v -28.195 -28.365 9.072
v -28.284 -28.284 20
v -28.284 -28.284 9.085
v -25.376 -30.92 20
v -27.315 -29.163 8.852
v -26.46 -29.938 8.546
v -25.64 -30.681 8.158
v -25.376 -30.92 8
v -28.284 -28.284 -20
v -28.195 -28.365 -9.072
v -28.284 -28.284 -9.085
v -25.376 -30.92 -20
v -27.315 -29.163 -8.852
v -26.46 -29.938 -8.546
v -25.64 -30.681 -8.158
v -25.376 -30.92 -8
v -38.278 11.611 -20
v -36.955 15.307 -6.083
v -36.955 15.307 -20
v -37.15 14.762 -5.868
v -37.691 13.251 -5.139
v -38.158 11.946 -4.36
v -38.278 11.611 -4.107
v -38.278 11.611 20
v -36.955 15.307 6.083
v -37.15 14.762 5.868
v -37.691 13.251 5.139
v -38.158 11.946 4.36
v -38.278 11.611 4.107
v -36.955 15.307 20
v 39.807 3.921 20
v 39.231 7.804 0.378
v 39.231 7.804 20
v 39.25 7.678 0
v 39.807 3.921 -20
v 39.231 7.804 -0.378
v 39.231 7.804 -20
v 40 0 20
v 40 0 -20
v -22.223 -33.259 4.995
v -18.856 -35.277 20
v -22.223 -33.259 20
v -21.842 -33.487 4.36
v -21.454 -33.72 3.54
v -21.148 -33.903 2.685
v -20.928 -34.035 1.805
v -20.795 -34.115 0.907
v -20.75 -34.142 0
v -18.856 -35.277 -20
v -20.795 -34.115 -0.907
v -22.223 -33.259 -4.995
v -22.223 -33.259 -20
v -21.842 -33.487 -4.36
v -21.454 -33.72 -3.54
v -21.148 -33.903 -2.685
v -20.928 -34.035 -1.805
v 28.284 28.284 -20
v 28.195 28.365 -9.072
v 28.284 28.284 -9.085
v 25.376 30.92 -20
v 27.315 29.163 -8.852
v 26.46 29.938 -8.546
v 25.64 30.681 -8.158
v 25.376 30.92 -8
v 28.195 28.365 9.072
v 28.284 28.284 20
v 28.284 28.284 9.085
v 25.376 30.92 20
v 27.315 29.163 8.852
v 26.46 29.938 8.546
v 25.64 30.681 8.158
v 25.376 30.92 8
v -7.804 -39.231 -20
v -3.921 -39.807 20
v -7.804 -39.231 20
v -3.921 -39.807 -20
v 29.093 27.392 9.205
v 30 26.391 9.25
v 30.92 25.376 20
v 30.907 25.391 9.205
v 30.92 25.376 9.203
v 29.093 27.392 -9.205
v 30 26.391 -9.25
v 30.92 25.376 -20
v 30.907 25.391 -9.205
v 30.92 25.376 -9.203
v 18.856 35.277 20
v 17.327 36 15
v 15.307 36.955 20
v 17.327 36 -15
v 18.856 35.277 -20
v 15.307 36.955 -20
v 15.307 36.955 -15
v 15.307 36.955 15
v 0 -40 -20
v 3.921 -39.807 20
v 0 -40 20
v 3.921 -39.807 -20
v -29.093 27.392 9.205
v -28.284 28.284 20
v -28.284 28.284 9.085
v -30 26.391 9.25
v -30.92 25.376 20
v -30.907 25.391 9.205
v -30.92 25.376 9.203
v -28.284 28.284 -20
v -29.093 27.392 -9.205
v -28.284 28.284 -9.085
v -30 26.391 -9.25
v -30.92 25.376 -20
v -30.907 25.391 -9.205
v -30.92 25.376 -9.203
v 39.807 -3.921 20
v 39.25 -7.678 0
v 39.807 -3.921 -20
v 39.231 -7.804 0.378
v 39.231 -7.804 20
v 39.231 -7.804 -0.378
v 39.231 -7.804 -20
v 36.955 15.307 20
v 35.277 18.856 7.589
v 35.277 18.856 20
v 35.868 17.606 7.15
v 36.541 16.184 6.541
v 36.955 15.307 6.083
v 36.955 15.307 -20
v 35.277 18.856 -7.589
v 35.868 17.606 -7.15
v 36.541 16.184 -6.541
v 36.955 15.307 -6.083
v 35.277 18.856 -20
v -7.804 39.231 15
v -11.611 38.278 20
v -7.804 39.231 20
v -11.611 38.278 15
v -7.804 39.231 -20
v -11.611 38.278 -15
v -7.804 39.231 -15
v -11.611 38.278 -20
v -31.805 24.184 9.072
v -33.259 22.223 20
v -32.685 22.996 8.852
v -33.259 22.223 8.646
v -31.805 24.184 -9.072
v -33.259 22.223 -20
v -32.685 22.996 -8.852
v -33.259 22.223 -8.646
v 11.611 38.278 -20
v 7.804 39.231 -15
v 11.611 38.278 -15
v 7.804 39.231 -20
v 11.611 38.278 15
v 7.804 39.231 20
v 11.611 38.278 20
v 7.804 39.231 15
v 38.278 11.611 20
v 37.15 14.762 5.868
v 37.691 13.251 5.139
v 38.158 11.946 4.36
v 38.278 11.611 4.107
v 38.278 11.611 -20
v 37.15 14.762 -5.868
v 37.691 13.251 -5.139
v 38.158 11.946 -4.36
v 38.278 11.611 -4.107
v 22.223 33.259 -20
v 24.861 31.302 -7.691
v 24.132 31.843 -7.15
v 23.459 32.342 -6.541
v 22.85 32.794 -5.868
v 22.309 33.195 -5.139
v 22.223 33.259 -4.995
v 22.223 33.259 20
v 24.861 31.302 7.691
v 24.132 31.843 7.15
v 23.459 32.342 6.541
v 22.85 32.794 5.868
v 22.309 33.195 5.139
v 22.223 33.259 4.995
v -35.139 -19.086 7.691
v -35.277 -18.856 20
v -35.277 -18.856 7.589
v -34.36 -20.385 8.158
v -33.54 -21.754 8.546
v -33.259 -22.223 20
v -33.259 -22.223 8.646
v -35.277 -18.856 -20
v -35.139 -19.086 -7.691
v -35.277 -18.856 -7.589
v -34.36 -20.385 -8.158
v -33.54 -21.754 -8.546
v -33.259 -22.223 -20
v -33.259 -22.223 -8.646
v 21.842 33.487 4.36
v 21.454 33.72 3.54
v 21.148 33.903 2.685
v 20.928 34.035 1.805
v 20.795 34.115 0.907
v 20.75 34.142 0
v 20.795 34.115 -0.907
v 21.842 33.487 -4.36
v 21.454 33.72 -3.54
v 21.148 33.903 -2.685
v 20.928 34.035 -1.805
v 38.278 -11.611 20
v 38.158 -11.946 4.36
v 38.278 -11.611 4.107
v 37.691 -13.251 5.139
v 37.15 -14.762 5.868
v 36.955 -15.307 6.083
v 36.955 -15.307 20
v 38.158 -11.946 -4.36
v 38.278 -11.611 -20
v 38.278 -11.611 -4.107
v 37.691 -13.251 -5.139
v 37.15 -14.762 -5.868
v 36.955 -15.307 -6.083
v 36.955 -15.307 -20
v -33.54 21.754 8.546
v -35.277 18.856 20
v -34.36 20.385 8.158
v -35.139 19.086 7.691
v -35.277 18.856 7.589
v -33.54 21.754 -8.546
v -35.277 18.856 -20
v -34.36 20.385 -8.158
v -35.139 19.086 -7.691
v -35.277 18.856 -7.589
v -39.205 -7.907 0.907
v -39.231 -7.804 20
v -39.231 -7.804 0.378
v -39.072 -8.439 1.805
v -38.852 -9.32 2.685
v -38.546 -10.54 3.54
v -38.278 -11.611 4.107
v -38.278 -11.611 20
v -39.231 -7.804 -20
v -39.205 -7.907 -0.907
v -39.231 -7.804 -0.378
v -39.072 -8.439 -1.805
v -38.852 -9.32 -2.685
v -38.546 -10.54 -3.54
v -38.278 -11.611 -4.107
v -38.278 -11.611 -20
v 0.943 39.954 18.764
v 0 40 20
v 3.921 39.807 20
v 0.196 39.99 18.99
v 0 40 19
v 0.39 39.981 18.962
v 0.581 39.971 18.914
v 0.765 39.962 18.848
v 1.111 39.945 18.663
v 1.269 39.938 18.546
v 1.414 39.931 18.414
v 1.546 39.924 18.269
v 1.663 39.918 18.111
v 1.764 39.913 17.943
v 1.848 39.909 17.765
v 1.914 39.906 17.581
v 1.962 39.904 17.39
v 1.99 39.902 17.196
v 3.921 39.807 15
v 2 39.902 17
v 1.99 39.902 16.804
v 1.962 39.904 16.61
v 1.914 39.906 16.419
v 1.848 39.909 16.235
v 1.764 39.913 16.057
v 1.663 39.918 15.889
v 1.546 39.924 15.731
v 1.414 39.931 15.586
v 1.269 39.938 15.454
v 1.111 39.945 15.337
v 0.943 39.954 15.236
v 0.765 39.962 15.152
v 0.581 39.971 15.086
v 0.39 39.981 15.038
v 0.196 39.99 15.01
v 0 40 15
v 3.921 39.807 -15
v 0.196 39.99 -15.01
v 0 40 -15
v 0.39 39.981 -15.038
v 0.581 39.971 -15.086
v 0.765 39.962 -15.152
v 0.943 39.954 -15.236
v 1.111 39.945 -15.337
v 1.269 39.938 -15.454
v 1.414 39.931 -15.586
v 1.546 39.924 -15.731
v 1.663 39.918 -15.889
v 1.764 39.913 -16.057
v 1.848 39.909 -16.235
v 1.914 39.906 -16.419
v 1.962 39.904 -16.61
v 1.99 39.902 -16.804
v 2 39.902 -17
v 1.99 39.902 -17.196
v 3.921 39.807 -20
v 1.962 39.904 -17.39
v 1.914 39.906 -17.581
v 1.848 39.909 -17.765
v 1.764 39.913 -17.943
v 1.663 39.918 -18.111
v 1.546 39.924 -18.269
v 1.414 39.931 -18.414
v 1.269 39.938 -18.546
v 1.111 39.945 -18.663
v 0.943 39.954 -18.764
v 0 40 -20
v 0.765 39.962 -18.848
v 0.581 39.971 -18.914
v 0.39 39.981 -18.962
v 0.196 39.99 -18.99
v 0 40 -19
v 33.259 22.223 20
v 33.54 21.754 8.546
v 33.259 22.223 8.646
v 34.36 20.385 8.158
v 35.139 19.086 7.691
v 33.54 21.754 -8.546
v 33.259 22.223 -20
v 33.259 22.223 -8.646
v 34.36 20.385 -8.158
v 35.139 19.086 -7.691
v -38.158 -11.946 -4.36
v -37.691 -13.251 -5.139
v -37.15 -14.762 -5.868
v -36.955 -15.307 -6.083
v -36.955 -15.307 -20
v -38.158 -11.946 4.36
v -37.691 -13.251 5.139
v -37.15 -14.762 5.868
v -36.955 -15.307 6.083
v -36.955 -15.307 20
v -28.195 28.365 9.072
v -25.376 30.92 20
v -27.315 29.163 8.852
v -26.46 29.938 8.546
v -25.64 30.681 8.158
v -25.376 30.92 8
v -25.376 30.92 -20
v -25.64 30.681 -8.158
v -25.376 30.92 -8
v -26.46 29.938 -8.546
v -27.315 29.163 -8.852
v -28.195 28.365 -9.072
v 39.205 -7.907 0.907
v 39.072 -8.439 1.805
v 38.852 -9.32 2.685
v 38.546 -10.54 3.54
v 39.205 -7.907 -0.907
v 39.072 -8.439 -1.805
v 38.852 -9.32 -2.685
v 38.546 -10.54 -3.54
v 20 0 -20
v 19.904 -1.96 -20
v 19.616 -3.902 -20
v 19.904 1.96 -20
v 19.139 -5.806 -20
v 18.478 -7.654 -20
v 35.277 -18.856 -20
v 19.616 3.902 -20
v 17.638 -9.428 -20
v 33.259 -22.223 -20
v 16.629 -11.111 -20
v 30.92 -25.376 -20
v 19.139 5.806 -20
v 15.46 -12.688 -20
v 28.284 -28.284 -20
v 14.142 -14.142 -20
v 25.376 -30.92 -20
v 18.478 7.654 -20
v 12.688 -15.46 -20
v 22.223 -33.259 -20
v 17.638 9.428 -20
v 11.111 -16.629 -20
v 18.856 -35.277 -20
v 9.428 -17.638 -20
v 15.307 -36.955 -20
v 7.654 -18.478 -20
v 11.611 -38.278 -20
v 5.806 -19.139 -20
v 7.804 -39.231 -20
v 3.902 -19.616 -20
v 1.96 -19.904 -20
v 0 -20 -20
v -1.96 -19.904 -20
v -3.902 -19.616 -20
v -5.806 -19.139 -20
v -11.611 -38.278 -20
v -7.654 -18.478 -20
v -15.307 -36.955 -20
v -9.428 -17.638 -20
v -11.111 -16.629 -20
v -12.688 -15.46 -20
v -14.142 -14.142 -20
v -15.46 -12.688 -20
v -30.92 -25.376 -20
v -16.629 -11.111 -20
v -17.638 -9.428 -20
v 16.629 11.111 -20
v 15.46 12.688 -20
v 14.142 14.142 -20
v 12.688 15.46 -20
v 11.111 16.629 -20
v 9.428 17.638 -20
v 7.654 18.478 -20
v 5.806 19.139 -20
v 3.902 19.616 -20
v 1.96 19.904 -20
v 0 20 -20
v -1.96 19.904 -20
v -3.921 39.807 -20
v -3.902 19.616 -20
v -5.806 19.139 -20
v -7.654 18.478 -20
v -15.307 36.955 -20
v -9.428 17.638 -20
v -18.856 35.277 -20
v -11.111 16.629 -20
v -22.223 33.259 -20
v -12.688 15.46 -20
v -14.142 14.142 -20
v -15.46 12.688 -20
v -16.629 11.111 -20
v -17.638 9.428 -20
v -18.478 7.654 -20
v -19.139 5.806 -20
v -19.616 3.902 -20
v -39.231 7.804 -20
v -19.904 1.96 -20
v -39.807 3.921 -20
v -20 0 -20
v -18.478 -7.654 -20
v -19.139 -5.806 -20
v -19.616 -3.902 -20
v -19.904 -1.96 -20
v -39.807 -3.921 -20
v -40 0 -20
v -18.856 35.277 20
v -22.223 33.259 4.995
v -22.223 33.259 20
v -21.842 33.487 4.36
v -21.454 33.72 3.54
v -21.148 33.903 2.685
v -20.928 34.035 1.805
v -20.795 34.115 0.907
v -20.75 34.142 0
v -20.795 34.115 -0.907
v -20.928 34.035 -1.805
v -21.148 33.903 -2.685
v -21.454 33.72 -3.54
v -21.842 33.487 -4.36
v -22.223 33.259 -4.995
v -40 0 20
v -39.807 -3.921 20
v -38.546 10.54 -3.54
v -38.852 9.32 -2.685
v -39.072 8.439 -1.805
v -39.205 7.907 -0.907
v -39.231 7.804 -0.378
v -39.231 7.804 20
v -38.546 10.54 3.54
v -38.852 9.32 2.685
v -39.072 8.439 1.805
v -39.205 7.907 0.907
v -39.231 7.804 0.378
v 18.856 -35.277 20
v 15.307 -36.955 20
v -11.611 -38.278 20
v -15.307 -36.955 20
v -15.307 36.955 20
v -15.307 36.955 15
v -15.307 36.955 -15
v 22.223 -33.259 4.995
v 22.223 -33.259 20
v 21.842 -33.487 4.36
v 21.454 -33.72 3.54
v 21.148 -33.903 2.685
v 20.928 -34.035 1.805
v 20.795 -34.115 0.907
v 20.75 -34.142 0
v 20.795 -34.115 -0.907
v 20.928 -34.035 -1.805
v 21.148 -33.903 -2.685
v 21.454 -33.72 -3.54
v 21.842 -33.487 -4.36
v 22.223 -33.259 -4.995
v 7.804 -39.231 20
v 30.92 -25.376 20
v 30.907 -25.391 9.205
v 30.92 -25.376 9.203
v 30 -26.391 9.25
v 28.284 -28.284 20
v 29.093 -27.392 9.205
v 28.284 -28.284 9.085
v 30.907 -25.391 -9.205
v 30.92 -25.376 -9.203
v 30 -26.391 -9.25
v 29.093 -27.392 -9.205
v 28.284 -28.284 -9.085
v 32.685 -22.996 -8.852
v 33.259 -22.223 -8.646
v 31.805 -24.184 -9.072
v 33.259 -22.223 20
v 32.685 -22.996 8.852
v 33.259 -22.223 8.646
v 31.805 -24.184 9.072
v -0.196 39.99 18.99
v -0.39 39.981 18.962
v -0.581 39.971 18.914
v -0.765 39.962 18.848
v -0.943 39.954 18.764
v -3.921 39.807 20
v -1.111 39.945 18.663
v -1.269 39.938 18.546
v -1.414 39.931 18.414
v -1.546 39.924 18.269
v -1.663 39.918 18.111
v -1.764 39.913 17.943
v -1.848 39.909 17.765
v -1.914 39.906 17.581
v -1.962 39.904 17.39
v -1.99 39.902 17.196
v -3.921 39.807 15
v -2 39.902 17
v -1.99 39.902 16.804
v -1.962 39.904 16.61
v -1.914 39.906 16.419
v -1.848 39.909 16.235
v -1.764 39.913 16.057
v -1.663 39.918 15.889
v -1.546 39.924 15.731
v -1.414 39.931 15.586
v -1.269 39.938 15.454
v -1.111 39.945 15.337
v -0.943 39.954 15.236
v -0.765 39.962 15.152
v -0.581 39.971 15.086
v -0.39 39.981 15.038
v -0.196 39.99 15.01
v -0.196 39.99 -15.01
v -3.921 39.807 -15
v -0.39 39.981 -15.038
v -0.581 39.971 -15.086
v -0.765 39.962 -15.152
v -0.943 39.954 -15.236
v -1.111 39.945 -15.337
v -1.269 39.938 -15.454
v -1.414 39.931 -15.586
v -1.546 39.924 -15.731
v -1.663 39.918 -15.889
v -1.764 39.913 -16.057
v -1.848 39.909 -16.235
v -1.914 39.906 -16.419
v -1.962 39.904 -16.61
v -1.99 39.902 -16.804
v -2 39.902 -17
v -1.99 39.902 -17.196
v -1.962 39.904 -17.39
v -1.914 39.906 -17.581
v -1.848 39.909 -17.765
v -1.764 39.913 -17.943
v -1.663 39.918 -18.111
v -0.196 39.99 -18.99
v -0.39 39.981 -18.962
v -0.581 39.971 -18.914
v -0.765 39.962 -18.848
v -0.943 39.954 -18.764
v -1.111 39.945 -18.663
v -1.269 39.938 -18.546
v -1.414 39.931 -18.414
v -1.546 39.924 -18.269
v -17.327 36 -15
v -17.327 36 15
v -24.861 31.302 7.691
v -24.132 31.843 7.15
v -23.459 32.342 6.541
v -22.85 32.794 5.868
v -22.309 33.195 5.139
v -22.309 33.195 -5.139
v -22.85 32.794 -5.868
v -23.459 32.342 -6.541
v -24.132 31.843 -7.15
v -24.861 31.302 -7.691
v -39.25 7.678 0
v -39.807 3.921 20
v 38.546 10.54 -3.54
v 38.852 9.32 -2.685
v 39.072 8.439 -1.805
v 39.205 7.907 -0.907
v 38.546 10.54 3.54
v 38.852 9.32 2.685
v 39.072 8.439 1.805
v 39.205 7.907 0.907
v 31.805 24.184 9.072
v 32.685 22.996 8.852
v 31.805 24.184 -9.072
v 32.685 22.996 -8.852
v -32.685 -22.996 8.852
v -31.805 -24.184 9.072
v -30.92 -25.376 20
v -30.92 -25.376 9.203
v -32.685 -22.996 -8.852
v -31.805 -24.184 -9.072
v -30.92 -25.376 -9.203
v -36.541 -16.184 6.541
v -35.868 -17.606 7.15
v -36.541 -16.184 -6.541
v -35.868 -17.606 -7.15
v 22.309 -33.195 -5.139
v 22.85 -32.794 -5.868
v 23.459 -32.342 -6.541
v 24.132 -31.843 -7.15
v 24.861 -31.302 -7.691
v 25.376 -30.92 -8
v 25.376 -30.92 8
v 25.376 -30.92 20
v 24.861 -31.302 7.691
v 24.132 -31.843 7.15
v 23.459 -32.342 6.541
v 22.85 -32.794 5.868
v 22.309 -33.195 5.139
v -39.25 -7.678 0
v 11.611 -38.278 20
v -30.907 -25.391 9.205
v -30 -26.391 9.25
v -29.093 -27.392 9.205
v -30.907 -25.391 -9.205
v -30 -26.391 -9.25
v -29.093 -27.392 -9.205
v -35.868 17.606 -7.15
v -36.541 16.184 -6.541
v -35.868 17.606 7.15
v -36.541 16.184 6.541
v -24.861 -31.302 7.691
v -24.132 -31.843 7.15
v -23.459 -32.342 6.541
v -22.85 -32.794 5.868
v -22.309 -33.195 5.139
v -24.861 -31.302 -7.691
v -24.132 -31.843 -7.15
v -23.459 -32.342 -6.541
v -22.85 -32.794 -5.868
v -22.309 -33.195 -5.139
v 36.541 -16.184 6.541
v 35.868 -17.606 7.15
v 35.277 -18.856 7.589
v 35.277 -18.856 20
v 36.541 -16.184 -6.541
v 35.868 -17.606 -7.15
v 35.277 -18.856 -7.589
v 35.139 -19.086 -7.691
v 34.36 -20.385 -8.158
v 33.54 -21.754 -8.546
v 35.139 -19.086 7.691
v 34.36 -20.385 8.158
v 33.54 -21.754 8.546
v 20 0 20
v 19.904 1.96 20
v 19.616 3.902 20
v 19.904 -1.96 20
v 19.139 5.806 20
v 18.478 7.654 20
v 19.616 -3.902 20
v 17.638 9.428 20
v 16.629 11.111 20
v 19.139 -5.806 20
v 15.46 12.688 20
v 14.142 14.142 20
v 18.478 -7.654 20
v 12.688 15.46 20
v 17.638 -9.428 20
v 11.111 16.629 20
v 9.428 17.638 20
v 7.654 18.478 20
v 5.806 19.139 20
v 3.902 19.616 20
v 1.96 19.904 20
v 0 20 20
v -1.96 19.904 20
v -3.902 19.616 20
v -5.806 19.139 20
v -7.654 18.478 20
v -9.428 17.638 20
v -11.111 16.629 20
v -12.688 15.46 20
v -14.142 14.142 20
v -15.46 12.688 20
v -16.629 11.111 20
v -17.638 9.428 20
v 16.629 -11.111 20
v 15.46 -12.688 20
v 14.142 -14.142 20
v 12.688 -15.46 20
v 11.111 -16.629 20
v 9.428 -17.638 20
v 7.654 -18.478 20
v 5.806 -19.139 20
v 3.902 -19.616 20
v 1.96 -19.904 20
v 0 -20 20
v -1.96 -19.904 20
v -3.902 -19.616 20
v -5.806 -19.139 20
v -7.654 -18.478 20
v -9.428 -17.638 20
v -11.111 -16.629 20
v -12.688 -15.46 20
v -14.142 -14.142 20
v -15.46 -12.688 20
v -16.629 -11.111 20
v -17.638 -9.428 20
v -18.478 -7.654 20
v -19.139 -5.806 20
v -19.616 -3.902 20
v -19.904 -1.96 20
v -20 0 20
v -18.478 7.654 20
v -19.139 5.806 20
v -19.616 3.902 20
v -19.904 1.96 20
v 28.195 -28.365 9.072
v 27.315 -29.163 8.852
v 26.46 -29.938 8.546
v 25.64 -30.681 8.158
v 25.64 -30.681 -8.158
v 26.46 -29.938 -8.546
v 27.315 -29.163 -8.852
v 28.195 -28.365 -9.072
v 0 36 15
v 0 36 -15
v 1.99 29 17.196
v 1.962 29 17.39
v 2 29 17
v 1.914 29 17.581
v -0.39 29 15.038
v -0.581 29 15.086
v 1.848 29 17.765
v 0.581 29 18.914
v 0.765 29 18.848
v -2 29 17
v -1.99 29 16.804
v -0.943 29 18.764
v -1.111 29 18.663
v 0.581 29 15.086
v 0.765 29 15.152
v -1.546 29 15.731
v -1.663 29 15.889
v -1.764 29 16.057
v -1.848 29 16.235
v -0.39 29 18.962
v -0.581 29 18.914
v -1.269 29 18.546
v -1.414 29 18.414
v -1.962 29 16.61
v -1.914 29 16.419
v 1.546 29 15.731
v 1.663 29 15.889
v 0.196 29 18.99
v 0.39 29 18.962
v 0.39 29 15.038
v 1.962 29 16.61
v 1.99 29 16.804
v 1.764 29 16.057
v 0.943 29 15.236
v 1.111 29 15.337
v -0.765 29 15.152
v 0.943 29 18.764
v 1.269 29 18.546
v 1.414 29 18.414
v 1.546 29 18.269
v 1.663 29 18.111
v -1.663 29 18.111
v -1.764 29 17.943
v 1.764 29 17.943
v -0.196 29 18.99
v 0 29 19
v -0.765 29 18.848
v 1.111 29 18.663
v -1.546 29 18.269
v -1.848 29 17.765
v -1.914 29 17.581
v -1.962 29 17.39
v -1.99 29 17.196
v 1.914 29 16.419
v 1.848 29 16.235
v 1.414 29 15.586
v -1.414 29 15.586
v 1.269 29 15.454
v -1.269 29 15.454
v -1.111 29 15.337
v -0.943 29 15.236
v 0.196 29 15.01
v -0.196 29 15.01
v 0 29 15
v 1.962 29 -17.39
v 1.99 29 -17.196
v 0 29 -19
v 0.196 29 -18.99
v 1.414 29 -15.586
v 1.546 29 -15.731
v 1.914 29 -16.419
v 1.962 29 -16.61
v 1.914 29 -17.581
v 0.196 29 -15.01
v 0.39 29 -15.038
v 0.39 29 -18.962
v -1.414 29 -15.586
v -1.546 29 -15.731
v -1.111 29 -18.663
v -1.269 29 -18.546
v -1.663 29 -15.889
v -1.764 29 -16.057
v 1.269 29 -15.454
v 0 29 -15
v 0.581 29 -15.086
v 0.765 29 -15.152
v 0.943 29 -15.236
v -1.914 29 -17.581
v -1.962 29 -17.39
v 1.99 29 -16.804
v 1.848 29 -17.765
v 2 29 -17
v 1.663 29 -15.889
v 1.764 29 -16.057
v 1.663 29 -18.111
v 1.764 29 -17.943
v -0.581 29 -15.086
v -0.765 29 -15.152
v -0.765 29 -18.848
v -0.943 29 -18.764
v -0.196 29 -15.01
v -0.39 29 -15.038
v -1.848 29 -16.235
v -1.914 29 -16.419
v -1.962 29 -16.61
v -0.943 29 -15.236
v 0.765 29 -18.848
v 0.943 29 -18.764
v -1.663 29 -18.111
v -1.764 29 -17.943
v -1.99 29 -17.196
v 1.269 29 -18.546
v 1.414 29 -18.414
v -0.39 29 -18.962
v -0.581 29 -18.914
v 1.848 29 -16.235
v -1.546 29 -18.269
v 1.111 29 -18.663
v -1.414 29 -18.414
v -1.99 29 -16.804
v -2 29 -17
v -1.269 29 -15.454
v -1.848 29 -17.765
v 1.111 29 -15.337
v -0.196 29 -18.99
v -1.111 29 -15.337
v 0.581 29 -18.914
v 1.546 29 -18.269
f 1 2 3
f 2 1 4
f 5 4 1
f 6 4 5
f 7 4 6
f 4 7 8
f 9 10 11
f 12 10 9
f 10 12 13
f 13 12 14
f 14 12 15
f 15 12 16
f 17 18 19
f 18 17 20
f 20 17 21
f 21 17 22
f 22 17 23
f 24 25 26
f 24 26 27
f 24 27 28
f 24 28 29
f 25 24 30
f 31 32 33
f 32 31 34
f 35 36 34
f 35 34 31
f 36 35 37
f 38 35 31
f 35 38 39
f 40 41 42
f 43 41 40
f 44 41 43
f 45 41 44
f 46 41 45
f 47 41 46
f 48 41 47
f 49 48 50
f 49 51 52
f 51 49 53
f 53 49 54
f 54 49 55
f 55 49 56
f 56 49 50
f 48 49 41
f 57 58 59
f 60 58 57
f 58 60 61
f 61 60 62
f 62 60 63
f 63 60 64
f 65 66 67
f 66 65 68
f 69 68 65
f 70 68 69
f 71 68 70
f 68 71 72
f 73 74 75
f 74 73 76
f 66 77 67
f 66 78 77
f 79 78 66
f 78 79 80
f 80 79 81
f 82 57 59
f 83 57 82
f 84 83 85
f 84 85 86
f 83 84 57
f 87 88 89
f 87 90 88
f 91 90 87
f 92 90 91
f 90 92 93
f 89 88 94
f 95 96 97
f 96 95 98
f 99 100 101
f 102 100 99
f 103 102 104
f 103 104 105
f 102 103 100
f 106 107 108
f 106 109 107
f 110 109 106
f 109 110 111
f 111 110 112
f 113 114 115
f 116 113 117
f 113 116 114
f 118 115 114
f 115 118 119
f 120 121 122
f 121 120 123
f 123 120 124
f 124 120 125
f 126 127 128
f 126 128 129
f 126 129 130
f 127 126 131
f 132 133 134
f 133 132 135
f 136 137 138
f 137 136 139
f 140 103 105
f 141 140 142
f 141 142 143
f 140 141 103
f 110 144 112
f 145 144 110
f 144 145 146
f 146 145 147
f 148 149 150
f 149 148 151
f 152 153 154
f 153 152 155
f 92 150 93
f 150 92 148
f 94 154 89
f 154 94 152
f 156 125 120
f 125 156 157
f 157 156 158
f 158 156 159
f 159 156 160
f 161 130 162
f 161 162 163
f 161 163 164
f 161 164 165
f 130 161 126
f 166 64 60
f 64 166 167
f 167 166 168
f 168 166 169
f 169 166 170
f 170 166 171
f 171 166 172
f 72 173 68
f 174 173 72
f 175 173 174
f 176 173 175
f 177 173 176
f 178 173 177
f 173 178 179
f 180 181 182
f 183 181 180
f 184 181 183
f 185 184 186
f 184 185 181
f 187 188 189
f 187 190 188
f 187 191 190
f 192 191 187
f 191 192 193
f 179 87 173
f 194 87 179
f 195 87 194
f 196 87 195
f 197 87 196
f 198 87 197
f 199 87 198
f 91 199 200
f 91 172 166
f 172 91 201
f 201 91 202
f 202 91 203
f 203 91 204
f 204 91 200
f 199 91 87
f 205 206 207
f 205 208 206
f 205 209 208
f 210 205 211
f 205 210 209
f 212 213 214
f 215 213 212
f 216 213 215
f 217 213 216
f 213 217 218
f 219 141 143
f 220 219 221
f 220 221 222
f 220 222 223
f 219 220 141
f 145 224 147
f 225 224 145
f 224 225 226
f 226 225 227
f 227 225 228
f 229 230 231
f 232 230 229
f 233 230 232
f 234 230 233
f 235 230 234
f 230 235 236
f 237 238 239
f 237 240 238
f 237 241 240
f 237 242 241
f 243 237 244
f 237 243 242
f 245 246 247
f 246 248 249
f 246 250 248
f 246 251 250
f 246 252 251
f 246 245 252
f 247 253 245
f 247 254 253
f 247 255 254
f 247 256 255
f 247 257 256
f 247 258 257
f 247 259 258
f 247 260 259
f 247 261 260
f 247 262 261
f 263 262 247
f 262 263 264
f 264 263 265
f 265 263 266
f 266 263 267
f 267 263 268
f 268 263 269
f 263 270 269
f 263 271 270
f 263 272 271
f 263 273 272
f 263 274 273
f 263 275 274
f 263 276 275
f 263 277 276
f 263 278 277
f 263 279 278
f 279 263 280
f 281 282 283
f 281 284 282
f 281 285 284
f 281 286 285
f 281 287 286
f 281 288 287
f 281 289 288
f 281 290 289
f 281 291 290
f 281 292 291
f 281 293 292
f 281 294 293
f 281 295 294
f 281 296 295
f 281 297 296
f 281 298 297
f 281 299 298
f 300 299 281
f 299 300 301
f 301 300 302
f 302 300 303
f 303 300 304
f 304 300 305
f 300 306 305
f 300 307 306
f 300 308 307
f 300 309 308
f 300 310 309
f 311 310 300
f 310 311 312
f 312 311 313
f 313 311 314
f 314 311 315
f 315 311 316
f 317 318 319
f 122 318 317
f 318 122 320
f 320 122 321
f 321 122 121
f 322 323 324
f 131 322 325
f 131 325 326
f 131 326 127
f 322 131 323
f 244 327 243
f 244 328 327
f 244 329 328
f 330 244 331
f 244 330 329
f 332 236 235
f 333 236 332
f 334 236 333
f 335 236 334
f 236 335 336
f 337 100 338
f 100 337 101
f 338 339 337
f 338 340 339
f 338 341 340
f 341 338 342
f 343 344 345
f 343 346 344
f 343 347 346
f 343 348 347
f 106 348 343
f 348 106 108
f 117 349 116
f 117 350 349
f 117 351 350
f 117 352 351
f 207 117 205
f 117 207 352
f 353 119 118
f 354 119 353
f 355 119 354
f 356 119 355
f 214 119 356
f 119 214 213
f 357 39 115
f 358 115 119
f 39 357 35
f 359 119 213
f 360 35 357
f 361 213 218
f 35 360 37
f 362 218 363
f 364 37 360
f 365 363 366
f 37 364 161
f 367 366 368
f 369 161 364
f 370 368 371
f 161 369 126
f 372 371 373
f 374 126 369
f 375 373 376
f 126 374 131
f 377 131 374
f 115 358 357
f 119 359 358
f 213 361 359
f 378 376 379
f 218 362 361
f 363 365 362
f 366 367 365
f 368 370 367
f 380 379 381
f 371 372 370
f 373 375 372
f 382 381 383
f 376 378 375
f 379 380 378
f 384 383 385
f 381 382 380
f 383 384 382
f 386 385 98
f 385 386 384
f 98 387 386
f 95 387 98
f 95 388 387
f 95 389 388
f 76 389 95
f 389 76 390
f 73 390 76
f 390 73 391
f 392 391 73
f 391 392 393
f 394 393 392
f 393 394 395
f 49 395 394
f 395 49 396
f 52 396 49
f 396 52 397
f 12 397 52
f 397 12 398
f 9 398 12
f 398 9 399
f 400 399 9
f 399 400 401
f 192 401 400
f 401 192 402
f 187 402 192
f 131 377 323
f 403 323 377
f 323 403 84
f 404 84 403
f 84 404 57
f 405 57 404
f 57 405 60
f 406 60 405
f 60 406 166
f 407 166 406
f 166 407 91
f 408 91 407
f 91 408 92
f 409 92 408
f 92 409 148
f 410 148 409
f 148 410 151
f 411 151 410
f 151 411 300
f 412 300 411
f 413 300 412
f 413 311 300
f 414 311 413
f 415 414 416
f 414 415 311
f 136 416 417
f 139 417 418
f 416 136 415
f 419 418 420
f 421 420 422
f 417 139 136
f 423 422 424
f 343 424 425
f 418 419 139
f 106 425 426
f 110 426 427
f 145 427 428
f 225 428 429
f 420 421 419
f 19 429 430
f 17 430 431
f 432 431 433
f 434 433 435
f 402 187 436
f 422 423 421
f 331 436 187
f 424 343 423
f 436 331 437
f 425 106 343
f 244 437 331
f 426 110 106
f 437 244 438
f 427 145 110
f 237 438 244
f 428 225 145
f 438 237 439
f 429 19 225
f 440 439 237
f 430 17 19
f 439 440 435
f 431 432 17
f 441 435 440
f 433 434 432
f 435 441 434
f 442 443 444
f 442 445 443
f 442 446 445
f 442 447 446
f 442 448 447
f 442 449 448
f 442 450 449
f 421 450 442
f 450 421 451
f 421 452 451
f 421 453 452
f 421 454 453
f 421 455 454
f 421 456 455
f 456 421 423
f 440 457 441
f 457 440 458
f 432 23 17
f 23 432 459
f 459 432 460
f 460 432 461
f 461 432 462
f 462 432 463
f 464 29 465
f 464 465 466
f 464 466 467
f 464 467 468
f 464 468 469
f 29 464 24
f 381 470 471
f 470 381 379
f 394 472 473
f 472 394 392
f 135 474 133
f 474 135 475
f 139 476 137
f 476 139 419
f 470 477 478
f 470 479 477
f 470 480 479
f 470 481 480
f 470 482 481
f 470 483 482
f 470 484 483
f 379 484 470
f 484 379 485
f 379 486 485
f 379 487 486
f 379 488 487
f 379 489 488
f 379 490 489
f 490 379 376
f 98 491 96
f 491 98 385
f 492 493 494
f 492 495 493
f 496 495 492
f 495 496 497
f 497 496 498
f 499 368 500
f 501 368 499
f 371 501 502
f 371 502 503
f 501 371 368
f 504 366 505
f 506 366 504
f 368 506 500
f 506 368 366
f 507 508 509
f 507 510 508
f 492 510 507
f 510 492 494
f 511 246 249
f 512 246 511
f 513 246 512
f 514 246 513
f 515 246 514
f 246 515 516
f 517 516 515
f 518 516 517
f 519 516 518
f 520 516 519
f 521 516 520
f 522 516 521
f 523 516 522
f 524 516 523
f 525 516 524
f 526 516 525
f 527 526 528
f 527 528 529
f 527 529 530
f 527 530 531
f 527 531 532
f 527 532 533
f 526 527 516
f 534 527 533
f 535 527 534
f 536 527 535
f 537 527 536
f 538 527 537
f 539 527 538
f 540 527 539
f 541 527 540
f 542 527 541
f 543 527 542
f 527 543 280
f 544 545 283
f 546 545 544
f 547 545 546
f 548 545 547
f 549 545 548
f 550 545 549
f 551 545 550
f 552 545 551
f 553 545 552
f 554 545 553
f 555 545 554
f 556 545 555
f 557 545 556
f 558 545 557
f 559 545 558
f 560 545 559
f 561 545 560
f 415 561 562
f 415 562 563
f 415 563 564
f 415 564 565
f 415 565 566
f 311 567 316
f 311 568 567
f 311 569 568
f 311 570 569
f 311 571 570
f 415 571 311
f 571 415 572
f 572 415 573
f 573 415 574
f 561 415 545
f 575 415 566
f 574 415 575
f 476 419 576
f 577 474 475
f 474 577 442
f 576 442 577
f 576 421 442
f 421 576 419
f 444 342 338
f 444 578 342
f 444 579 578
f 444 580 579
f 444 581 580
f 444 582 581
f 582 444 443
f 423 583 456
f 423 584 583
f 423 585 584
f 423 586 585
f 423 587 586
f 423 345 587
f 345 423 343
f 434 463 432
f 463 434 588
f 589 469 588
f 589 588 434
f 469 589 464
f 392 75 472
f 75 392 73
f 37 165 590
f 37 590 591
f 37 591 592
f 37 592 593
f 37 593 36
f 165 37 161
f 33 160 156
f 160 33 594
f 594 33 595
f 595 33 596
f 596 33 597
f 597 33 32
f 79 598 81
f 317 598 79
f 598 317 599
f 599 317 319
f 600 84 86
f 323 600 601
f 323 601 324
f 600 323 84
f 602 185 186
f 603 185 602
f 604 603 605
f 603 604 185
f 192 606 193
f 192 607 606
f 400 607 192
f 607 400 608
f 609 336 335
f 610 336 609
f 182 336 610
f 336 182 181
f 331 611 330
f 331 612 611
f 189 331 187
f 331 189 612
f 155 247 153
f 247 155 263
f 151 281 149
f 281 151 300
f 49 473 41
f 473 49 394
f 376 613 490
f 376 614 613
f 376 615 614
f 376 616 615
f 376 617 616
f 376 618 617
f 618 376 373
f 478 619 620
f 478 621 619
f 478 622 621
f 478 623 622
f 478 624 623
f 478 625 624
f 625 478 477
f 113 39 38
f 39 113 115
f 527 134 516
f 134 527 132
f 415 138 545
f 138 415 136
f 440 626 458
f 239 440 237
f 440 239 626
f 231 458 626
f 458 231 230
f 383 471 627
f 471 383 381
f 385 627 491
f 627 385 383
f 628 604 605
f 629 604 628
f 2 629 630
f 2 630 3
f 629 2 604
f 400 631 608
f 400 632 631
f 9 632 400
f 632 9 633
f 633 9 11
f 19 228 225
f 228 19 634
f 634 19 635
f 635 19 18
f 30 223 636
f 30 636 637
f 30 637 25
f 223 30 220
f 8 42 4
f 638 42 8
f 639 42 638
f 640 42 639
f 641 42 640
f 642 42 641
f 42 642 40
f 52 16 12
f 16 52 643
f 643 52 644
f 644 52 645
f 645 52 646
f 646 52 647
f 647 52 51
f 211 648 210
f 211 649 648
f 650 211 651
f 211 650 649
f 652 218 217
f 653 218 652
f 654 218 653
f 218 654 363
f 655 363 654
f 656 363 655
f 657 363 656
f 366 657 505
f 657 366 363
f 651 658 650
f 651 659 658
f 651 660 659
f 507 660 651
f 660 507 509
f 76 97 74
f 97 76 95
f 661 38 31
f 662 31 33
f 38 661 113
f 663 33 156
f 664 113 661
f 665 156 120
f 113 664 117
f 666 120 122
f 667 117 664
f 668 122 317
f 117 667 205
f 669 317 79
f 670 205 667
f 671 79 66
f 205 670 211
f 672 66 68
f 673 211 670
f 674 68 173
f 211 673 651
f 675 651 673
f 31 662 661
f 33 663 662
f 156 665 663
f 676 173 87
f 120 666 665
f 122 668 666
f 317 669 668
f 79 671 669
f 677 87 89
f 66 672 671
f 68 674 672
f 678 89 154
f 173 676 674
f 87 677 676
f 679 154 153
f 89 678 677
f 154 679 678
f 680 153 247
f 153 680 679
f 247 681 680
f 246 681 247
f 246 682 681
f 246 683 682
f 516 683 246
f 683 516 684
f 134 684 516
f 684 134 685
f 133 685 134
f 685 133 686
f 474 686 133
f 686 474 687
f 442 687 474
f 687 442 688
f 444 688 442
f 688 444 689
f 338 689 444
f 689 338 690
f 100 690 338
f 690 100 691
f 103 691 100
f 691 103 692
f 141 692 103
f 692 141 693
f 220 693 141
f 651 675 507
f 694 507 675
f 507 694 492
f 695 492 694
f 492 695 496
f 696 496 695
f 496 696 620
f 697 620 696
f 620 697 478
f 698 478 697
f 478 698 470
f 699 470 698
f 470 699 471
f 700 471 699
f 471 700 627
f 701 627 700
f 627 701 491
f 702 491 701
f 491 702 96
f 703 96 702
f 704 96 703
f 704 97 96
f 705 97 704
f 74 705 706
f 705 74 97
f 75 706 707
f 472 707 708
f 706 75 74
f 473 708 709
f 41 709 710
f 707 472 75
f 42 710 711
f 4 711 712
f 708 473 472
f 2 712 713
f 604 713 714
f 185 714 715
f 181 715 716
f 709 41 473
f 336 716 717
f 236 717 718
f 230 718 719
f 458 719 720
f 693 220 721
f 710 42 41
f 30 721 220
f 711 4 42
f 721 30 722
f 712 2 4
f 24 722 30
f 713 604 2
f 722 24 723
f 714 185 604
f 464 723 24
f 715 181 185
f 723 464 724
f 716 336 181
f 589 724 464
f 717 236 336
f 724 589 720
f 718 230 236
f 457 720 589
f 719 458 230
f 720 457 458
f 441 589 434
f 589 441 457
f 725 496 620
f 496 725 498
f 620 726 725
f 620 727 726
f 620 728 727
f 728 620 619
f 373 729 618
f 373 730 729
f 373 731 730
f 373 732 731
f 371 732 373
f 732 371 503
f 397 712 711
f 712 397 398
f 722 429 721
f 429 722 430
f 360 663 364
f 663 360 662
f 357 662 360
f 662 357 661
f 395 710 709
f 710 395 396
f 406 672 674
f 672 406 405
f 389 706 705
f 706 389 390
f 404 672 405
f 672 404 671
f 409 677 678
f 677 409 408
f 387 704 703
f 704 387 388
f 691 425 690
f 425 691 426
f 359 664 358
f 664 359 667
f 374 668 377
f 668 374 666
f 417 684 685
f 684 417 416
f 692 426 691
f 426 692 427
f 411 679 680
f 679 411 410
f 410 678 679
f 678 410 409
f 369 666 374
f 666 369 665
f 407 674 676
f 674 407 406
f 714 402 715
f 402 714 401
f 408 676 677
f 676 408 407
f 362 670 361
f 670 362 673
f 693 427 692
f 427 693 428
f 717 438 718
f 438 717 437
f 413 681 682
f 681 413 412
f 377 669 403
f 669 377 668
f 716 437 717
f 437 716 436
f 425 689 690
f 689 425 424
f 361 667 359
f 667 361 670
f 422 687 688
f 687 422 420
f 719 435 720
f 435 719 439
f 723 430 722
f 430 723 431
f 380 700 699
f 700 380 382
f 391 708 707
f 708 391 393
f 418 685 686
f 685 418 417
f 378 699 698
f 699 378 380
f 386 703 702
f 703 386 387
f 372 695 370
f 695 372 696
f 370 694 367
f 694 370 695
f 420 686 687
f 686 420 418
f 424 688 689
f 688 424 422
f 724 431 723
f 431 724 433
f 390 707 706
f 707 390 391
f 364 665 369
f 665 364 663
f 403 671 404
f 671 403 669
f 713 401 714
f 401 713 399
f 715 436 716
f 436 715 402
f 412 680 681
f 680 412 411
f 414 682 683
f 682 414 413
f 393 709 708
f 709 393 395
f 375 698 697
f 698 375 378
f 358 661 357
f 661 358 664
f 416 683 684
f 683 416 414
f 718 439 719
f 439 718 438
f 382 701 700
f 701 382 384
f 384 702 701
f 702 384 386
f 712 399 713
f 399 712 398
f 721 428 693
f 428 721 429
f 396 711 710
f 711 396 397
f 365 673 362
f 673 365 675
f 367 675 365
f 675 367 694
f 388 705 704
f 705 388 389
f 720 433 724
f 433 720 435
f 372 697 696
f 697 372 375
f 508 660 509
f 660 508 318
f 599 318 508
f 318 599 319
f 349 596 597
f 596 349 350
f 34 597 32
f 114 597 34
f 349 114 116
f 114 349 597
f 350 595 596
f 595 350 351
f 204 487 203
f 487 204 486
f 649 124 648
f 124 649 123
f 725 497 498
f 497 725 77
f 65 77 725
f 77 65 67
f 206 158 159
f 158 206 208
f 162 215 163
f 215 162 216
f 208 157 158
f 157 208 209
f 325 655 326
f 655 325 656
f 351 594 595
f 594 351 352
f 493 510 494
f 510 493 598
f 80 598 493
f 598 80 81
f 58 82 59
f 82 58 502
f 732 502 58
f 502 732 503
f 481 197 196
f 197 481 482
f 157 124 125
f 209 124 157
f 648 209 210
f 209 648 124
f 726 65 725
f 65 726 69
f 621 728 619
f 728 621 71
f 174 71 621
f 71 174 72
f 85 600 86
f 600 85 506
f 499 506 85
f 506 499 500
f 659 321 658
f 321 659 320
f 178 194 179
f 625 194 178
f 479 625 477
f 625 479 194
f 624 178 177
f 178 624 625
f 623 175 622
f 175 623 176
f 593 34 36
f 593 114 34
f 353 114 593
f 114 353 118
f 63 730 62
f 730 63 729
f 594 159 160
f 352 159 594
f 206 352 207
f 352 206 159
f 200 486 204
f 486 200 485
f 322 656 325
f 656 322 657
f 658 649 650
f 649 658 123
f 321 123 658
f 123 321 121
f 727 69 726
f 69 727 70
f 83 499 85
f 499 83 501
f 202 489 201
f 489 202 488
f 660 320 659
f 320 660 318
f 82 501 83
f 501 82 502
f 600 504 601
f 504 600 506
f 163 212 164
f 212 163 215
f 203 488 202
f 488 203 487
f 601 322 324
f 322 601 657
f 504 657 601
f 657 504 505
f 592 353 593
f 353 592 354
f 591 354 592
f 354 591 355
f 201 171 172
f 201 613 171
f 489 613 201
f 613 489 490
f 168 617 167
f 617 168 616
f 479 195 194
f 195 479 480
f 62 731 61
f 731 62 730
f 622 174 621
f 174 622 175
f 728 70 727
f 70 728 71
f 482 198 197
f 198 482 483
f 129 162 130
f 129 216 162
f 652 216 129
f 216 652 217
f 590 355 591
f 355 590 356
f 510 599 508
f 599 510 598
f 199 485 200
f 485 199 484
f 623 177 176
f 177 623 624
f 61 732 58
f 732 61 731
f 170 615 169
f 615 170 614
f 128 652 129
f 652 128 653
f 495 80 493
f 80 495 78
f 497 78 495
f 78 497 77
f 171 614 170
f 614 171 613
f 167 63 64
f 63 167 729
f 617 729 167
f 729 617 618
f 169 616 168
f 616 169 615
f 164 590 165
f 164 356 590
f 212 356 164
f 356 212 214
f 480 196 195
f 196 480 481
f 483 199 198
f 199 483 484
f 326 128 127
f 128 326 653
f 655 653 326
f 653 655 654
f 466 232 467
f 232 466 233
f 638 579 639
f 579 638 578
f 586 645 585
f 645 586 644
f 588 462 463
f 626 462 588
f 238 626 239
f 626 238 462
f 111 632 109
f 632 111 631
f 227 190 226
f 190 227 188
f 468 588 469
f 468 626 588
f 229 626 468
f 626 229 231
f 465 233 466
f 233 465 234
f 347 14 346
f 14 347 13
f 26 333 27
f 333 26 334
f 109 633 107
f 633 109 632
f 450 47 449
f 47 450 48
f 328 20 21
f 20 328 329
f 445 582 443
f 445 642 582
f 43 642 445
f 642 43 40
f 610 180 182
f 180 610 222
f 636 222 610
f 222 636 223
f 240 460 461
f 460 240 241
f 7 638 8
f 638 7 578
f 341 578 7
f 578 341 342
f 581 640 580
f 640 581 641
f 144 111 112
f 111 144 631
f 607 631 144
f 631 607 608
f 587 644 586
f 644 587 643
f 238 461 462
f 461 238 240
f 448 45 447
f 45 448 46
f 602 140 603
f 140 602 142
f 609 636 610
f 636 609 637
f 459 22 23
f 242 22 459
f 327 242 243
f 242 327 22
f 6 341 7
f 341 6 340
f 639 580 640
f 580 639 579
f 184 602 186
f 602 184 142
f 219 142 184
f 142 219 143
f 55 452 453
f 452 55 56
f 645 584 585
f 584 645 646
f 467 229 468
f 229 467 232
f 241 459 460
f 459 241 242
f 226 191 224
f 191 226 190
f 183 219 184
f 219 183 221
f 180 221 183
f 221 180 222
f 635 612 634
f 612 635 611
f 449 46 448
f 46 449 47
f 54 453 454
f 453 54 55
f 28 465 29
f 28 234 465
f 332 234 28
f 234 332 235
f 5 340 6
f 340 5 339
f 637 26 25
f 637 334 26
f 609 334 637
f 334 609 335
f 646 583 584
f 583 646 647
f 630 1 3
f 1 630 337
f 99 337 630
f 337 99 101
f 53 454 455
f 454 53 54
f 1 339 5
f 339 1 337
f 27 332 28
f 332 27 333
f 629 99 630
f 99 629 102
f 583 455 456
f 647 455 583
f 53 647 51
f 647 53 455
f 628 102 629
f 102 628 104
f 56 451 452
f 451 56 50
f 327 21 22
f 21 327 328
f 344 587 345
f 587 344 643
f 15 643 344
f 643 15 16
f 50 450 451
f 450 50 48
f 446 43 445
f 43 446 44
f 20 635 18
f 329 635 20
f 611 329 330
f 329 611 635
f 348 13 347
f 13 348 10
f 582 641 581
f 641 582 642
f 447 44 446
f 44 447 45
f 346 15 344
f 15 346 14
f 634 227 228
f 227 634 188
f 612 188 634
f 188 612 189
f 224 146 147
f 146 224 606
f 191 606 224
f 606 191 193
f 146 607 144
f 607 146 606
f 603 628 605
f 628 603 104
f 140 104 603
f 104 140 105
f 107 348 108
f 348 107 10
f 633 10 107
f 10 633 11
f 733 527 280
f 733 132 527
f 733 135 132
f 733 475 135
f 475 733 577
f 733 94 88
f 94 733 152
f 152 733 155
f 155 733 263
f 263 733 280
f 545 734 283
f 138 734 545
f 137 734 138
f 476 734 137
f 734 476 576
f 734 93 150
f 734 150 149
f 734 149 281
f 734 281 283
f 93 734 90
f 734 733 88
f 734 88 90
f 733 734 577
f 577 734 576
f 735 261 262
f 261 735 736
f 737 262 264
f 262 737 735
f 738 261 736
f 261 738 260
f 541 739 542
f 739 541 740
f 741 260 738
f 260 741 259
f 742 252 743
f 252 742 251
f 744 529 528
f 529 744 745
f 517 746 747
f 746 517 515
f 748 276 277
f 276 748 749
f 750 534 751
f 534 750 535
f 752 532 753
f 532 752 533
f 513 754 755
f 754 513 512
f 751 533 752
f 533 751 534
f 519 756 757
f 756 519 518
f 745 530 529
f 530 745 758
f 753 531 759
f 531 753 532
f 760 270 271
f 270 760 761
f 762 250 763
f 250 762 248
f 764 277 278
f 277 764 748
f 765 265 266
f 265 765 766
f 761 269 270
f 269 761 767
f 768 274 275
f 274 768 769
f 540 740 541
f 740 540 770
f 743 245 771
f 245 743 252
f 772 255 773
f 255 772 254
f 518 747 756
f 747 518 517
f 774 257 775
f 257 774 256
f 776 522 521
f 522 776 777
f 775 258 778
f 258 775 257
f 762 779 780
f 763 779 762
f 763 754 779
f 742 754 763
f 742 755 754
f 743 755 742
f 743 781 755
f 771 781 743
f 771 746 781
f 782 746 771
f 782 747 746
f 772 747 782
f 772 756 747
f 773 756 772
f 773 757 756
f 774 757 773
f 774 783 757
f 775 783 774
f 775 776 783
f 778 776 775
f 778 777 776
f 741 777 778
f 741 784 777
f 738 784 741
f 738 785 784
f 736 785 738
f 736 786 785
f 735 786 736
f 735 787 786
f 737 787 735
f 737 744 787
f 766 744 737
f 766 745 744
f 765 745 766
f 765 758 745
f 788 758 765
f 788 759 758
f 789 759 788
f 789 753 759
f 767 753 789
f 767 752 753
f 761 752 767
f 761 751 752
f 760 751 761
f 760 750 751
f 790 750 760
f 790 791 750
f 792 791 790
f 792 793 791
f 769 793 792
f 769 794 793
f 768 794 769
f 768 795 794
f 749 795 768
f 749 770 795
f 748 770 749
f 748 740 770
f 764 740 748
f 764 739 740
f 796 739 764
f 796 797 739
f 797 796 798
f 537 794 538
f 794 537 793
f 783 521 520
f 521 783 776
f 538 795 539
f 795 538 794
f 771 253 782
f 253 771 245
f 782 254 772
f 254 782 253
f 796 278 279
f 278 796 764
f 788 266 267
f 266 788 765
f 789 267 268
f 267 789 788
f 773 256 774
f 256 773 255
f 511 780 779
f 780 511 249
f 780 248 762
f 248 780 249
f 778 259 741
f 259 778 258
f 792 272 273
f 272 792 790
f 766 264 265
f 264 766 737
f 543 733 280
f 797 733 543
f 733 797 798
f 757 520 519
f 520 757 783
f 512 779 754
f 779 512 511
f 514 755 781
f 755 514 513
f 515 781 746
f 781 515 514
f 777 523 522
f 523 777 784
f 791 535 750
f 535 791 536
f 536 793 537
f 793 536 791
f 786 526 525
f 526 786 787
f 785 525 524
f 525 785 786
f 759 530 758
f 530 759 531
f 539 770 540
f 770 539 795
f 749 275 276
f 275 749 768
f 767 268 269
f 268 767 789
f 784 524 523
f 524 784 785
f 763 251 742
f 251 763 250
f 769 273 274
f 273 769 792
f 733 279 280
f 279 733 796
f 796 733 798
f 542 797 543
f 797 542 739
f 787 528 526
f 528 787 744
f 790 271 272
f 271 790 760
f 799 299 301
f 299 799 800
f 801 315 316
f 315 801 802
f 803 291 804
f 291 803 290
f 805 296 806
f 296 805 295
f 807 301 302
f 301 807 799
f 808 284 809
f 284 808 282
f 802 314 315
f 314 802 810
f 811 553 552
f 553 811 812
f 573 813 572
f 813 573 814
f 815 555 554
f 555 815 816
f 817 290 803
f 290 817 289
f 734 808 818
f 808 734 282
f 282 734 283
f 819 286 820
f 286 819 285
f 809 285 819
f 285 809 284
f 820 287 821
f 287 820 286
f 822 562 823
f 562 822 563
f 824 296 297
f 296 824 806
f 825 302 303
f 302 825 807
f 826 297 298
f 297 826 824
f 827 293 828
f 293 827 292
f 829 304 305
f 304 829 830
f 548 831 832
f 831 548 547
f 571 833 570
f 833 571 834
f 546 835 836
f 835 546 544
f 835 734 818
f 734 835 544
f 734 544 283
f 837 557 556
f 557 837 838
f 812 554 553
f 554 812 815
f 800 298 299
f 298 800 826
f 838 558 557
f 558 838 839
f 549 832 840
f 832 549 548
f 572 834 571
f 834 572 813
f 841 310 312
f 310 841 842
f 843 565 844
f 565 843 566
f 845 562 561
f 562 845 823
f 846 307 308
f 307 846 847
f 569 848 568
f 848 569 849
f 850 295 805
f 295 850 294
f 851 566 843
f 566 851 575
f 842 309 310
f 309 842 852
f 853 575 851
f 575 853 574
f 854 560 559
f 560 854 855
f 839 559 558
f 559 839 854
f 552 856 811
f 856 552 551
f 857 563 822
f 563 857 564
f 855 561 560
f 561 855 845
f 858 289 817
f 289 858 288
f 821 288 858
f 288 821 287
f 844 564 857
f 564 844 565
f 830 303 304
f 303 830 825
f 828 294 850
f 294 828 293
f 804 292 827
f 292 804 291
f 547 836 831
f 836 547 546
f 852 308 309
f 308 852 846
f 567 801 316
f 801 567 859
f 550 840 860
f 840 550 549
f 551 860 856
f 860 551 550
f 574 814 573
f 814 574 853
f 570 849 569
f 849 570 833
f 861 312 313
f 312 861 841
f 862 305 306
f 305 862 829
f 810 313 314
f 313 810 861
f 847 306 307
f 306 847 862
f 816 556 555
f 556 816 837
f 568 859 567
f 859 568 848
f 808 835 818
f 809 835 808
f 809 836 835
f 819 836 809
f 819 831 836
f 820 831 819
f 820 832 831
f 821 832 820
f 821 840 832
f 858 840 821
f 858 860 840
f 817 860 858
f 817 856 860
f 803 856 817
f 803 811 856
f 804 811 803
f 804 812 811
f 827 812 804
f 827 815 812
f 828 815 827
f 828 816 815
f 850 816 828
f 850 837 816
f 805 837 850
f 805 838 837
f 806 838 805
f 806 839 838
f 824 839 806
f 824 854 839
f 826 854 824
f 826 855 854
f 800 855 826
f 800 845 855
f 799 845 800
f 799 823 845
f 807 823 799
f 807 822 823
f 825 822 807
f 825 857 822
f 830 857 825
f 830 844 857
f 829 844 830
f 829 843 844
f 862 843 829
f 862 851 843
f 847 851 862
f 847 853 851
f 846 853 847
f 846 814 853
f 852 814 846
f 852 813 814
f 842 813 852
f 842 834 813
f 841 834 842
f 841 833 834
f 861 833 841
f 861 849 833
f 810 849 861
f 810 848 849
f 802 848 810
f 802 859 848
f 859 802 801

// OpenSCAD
// COBRA Vertebra - T2 V8
// Height: 40.0mm, OD: 80.0mm

$fn = 64;

difference() {
    // Outer cylinder
    cylinder(h=40.0, d=80.0, center=true);
    
    // Inner channel
    cylinder(h=42.0, d=40.0, center=true);

    // Battery cavity 1
    rotate([0, 0, 0])
    translate([30.0, 0, 0])
    rotate([90, 0, 0])
    cylinder(h=74.0, d=18.5, center=true);

    // Battery cavity 2
    rotate([0, 0, 180])
    translate([30.0, 0, 0])
    rotate([90, 0, 0])
    cylinder(h=74.0, d=18.5, center=true);

    // Solar panel cavity
    translate([0, 38.0, 0])
    cube([50, 4, 30], center=true);

    // Pivot holes
    translate([0, 40.0, 17.0])
    rotate([90, 0, 0])
    cylinder(h=22.0, d=4, center=true);
    
    translate([0, 40.0, -17.0])
    rotate([90, 0, 0])
    cylinder(h=22.0, d=4, center=true);
}
